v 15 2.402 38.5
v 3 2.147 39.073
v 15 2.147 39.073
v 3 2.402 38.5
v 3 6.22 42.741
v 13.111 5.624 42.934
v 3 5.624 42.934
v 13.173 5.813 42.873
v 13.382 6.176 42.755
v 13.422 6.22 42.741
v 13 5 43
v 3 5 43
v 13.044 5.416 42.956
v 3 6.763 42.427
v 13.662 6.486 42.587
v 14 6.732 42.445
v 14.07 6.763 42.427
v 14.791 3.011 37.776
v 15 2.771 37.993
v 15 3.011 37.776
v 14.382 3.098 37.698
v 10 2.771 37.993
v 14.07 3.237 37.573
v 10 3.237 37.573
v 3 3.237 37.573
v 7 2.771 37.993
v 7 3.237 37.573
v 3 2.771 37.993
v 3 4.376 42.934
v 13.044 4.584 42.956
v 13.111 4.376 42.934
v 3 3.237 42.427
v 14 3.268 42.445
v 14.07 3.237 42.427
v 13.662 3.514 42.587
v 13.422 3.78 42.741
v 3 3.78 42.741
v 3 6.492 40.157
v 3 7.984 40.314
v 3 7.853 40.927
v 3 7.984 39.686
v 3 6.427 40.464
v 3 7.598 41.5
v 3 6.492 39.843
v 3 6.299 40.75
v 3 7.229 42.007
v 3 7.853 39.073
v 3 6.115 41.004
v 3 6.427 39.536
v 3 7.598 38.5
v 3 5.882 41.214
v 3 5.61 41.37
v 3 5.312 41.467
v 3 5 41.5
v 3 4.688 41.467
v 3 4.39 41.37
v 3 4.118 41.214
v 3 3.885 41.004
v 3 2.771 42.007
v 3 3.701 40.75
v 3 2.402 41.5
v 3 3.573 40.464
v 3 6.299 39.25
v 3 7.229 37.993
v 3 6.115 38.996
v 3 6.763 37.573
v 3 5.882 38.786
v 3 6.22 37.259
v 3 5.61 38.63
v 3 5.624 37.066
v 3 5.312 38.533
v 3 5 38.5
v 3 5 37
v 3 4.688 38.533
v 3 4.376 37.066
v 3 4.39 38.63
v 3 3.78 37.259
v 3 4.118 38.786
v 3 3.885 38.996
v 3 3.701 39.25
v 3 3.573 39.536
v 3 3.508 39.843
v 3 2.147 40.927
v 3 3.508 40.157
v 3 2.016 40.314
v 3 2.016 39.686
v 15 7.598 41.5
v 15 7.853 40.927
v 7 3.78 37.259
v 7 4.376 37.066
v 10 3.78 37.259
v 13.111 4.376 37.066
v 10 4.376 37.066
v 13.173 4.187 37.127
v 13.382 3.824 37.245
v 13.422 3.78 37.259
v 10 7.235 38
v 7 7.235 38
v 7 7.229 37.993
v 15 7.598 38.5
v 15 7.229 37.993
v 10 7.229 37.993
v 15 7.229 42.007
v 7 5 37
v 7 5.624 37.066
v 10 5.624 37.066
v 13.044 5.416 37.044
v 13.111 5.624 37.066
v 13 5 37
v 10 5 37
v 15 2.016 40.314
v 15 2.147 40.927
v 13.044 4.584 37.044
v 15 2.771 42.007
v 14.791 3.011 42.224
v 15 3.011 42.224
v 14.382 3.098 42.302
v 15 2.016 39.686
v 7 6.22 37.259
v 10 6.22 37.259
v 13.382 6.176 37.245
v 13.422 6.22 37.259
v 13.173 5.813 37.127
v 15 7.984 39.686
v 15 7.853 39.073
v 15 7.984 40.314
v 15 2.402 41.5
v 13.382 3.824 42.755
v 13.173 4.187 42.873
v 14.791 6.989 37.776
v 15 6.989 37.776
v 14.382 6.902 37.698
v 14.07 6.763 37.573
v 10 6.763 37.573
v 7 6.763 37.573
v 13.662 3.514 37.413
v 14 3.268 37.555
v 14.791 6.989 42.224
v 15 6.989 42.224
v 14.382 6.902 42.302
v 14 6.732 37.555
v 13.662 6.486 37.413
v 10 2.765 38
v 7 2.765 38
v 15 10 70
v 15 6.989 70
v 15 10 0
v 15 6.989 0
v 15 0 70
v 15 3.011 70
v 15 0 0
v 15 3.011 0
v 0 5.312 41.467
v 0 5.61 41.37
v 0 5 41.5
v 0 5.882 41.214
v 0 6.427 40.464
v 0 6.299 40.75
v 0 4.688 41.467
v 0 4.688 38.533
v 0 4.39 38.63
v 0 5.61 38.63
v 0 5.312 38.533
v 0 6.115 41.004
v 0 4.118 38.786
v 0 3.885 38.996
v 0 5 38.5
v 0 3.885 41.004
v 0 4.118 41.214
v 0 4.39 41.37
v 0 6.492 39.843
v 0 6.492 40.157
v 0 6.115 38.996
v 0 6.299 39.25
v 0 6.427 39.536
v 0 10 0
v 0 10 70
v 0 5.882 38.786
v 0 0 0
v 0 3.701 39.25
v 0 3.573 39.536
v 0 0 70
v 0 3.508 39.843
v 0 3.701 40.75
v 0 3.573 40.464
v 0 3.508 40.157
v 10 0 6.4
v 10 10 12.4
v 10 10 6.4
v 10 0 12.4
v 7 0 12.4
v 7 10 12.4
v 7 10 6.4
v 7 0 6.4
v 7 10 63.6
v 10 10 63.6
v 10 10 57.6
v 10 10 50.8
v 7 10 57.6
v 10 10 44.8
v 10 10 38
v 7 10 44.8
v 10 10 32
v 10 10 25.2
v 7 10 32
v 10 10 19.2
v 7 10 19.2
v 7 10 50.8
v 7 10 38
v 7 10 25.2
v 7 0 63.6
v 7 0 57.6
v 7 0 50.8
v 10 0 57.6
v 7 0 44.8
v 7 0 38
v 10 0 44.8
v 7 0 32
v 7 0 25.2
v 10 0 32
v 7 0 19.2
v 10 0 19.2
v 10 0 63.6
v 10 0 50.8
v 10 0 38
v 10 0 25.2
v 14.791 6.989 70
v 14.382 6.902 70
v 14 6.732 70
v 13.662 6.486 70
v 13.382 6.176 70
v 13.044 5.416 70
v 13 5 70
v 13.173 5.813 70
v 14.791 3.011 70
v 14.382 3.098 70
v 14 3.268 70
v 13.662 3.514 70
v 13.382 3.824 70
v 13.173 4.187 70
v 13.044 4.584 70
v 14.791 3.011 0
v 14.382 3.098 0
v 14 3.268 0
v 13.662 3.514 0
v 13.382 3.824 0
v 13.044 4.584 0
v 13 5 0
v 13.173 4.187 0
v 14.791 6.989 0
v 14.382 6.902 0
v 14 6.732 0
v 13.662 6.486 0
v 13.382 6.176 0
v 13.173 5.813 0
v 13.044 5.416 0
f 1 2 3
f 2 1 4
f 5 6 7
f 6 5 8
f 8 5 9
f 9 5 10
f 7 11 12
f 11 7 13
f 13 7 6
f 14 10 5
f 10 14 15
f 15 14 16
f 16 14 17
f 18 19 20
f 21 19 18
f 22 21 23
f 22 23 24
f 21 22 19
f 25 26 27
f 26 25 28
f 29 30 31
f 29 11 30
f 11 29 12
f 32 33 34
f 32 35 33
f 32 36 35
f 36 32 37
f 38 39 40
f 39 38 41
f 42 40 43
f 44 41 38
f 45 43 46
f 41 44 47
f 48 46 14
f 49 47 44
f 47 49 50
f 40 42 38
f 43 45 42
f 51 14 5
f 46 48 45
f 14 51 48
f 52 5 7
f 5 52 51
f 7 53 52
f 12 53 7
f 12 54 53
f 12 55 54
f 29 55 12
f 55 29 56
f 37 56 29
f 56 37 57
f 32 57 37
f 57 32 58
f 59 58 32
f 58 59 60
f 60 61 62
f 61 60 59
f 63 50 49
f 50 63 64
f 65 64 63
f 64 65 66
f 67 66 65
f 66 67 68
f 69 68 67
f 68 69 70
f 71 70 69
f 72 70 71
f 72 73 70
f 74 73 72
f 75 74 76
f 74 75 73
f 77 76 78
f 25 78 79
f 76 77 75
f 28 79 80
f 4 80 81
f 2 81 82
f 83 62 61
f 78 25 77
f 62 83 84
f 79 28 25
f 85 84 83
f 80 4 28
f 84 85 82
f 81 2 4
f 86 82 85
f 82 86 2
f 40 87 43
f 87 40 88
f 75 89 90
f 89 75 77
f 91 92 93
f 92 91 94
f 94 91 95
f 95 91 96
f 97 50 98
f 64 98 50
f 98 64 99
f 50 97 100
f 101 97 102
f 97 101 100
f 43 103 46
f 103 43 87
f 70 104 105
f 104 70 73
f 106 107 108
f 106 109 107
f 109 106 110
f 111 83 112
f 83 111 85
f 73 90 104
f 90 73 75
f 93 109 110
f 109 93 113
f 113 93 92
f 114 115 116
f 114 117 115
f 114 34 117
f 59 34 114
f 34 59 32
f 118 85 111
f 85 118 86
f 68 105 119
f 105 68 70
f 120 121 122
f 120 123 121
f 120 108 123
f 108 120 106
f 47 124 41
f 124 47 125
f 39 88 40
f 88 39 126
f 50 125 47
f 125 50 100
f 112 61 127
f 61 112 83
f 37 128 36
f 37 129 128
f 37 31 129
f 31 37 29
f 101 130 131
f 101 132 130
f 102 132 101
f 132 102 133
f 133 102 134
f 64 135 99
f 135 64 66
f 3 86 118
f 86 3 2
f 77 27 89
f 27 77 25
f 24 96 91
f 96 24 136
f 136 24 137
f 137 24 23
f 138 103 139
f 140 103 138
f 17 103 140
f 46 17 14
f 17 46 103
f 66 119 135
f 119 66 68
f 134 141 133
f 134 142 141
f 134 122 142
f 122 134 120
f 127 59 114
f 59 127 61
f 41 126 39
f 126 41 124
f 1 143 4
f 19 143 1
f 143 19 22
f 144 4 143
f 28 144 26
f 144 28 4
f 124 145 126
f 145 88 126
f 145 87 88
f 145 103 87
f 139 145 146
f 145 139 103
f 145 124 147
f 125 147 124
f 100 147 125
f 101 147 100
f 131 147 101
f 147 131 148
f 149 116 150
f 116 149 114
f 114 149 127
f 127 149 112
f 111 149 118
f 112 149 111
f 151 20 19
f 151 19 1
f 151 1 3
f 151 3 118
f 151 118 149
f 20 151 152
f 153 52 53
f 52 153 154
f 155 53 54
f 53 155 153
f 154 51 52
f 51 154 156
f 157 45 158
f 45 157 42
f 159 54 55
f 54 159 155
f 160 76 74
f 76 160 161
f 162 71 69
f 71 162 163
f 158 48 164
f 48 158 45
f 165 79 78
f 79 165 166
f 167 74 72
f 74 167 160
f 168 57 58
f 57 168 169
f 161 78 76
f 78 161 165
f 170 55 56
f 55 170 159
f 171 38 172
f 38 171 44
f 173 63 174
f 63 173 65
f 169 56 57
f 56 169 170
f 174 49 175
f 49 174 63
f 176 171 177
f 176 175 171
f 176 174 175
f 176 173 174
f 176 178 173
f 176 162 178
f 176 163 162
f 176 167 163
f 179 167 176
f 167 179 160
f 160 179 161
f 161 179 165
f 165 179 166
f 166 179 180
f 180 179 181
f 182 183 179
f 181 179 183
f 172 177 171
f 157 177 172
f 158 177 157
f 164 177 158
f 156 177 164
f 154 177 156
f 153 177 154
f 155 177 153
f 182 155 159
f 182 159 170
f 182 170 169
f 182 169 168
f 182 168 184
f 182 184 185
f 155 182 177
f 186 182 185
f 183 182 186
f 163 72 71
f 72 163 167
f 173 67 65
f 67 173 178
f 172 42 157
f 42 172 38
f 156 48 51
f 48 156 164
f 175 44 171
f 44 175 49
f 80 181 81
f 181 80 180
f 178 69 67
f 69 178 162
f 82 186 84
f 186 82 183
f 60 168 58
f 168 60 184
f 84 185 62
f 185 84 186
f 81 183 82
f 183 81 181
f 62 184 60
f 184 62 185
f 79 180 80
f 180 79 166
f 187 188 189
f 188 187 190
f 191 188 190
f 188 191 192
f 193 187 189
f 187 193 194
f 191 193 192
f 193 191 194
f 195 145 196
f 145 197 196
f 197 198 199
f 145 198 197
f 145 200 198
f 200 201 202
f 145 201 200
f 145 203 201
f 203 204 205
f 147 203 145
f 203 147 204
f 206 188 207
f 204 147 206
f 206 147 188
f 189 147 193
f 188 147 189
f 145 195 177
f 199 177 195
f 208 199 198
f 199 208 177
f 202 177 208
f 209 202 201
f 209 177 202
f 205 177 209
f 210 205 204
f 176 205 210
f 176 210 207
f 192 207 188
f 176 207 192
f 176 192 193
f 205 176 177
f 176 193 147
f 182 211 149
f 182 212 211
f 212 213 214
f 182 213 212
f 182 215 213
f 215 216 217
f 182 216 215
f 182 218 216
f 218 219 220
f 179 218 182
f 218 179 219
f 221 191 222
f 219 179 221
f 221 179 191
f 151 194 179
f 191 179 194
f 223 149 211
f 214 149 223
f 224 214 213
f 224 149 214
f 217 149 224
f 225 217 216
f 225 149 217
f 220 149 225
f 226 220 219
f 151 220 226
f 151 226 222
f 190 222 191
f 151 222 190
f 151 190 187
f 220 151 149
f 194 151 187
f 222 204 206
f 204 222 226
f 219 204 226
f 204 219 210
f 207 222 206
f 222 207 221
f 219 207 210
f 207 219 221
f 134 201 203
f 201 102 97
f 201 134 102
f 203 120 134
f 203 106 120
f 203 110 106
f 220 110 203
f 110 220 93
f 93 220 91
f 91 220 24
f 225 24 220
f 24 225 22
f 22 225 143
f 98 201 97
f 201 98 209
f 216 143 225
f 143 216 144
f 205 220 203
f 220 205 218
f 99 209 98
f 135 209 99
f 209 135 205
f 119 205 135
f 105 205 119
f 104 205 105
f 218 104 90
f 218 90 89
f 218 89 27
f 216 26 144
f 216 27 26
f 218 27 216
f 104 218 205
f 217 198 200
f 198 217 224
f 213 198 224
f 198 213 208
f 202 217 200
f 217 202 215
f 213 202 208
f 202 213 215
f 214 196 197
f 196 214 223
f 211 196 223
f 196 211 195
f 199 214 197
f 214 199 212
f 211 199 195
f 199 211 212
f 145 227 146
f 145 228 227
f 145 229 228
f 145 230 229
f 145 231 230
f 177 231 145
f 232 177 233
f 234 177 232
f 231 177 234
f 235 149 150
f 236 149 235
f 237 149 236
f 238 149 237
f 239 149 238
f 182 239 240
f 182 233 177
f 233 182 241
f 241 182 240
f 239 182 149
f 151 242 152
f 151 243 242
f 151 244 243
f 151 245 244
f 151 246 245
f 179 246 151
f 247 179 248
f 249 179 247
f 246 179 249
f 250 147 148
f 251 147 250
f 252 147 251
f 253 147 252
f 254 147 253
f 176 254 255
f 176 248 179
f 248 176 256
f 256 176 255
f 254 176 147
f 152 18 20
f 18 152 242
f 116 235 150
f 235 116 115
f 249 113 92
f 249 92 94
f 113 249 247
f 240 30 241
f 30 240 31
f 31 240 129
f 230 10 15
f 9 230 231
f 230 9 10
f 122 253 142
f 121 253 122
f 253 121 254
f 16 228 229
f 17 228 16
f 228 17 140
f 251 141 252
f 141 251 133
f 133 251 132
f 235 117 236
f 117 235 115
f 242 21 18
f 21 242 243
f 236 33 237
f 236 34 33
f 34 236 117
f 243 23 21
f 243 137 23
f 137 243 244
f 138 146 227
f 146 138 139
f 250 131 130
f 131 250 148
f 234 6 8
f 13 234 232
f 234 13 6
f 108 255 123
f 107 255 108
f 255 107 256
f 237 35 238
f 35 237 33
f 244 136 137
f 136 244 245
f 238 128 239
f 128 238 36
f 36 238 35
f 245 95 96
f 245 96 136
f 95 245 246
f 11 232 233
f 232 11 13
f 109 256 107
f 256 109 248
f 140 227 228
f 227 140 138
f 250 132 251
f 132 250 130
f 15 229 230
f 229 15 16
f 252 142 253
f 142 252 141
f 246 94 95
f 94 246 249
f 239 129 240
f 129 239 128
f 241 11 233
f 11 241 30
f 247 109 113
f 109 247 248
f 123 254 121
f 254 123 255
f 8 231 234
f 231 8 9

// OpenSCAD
//
//general
//
$fn = 30;
tube_dia = 4;
eps = 0.2;

//
//extruder guide
//
//strength of material
ex_s = 3;
//distance from extruder filament input to holder (depth of part)
ex_depth = 15;

//lower length of extruder holder
ex_hlower = 40;
ex_hupper = 30;

ex_hole_dia = 3;
ex_hole_head_dia = 6;
ex_hole_head_depth = ex_depth - 3;

//cable tie holes
ex_num_cth = 5;
ex_cth_w = 6;
ex_cth_h = 3;

//
//guide next to filament spool
//
//strength of material
fil_s = 5;
//depth of part
fil_depth = 20;

//lower length of extruder holder
fil_hlower = 30;
fil_hupper = 70;

fil_hole_dia = 4+0.4+0.2;
fil_hole_head_dia = 8;
fil_hole_head_depth = fil_depth - 3;

//cable tie holes
fil_num_cth = 3;
fil_cth_w = 6;
fil_cth_h = 3;




module tube_guide(s, tube_dia, lower_height, upper_height, depth, hole_dia, hole_head_dia, hole_head_depth, num_cth, cth_w, cth_h,add_profile_guide=false) {
    h = lower_height + upper_height;
    w = tube_dia + 2*s;

    difference(){
    cube([depth,w,h]);
    translate([depth,w/2,0]) cylinder(h, tube_dia/2,tube_dia/2);
    translate([depth,w/2,lower_height]) rotate([0,-90,0]) {cylinder(hole_head_depth, hole_head_dia/2,hole_head_dia/2);
    cylinder(depth, hole_dia/2,hole_dia/2);
    }



    step_cth = (h - 2*s)/num_cth;
    for(z = [0:num_cth]) {
        translate([depth-tube_dia/2-s-cth_h,0,s + z*step_cth+ (step_cth-cth_w)/2])cube([cth_h,w,cth_w]);
        
        }


    }
    if(add_profile_guide) {
        difference(){
            union(){
                translate([-2,0,lower_height-10-eps-2]) cube([2,w,2]); 
                translate([-2,0,lower_height+10+eps]) cube([2,w,2]); 
            }
            translate([-2,w/2-tube_dia/2,0])cube([2,tube_dia,h]);
       }
    }
}


tube_guide(ex_s, tube_dia, ex_hlower, ex_hupper, ex_depth, ex_hole_dia, ex_hole_head_dia, ex_hole_head_depth, ex_num_cth, ex_cth_w, ex_cth_h);
//translate([0,30,0])tube_guide(fil_s, tube_dia, fil_hlower, fil_hupper, fil_depth, fil_hole_dia, fil_hole_head_dia, fil_hole_head_depth, fil_num_cth, fil_cth_w, fil_cth_h, true);
